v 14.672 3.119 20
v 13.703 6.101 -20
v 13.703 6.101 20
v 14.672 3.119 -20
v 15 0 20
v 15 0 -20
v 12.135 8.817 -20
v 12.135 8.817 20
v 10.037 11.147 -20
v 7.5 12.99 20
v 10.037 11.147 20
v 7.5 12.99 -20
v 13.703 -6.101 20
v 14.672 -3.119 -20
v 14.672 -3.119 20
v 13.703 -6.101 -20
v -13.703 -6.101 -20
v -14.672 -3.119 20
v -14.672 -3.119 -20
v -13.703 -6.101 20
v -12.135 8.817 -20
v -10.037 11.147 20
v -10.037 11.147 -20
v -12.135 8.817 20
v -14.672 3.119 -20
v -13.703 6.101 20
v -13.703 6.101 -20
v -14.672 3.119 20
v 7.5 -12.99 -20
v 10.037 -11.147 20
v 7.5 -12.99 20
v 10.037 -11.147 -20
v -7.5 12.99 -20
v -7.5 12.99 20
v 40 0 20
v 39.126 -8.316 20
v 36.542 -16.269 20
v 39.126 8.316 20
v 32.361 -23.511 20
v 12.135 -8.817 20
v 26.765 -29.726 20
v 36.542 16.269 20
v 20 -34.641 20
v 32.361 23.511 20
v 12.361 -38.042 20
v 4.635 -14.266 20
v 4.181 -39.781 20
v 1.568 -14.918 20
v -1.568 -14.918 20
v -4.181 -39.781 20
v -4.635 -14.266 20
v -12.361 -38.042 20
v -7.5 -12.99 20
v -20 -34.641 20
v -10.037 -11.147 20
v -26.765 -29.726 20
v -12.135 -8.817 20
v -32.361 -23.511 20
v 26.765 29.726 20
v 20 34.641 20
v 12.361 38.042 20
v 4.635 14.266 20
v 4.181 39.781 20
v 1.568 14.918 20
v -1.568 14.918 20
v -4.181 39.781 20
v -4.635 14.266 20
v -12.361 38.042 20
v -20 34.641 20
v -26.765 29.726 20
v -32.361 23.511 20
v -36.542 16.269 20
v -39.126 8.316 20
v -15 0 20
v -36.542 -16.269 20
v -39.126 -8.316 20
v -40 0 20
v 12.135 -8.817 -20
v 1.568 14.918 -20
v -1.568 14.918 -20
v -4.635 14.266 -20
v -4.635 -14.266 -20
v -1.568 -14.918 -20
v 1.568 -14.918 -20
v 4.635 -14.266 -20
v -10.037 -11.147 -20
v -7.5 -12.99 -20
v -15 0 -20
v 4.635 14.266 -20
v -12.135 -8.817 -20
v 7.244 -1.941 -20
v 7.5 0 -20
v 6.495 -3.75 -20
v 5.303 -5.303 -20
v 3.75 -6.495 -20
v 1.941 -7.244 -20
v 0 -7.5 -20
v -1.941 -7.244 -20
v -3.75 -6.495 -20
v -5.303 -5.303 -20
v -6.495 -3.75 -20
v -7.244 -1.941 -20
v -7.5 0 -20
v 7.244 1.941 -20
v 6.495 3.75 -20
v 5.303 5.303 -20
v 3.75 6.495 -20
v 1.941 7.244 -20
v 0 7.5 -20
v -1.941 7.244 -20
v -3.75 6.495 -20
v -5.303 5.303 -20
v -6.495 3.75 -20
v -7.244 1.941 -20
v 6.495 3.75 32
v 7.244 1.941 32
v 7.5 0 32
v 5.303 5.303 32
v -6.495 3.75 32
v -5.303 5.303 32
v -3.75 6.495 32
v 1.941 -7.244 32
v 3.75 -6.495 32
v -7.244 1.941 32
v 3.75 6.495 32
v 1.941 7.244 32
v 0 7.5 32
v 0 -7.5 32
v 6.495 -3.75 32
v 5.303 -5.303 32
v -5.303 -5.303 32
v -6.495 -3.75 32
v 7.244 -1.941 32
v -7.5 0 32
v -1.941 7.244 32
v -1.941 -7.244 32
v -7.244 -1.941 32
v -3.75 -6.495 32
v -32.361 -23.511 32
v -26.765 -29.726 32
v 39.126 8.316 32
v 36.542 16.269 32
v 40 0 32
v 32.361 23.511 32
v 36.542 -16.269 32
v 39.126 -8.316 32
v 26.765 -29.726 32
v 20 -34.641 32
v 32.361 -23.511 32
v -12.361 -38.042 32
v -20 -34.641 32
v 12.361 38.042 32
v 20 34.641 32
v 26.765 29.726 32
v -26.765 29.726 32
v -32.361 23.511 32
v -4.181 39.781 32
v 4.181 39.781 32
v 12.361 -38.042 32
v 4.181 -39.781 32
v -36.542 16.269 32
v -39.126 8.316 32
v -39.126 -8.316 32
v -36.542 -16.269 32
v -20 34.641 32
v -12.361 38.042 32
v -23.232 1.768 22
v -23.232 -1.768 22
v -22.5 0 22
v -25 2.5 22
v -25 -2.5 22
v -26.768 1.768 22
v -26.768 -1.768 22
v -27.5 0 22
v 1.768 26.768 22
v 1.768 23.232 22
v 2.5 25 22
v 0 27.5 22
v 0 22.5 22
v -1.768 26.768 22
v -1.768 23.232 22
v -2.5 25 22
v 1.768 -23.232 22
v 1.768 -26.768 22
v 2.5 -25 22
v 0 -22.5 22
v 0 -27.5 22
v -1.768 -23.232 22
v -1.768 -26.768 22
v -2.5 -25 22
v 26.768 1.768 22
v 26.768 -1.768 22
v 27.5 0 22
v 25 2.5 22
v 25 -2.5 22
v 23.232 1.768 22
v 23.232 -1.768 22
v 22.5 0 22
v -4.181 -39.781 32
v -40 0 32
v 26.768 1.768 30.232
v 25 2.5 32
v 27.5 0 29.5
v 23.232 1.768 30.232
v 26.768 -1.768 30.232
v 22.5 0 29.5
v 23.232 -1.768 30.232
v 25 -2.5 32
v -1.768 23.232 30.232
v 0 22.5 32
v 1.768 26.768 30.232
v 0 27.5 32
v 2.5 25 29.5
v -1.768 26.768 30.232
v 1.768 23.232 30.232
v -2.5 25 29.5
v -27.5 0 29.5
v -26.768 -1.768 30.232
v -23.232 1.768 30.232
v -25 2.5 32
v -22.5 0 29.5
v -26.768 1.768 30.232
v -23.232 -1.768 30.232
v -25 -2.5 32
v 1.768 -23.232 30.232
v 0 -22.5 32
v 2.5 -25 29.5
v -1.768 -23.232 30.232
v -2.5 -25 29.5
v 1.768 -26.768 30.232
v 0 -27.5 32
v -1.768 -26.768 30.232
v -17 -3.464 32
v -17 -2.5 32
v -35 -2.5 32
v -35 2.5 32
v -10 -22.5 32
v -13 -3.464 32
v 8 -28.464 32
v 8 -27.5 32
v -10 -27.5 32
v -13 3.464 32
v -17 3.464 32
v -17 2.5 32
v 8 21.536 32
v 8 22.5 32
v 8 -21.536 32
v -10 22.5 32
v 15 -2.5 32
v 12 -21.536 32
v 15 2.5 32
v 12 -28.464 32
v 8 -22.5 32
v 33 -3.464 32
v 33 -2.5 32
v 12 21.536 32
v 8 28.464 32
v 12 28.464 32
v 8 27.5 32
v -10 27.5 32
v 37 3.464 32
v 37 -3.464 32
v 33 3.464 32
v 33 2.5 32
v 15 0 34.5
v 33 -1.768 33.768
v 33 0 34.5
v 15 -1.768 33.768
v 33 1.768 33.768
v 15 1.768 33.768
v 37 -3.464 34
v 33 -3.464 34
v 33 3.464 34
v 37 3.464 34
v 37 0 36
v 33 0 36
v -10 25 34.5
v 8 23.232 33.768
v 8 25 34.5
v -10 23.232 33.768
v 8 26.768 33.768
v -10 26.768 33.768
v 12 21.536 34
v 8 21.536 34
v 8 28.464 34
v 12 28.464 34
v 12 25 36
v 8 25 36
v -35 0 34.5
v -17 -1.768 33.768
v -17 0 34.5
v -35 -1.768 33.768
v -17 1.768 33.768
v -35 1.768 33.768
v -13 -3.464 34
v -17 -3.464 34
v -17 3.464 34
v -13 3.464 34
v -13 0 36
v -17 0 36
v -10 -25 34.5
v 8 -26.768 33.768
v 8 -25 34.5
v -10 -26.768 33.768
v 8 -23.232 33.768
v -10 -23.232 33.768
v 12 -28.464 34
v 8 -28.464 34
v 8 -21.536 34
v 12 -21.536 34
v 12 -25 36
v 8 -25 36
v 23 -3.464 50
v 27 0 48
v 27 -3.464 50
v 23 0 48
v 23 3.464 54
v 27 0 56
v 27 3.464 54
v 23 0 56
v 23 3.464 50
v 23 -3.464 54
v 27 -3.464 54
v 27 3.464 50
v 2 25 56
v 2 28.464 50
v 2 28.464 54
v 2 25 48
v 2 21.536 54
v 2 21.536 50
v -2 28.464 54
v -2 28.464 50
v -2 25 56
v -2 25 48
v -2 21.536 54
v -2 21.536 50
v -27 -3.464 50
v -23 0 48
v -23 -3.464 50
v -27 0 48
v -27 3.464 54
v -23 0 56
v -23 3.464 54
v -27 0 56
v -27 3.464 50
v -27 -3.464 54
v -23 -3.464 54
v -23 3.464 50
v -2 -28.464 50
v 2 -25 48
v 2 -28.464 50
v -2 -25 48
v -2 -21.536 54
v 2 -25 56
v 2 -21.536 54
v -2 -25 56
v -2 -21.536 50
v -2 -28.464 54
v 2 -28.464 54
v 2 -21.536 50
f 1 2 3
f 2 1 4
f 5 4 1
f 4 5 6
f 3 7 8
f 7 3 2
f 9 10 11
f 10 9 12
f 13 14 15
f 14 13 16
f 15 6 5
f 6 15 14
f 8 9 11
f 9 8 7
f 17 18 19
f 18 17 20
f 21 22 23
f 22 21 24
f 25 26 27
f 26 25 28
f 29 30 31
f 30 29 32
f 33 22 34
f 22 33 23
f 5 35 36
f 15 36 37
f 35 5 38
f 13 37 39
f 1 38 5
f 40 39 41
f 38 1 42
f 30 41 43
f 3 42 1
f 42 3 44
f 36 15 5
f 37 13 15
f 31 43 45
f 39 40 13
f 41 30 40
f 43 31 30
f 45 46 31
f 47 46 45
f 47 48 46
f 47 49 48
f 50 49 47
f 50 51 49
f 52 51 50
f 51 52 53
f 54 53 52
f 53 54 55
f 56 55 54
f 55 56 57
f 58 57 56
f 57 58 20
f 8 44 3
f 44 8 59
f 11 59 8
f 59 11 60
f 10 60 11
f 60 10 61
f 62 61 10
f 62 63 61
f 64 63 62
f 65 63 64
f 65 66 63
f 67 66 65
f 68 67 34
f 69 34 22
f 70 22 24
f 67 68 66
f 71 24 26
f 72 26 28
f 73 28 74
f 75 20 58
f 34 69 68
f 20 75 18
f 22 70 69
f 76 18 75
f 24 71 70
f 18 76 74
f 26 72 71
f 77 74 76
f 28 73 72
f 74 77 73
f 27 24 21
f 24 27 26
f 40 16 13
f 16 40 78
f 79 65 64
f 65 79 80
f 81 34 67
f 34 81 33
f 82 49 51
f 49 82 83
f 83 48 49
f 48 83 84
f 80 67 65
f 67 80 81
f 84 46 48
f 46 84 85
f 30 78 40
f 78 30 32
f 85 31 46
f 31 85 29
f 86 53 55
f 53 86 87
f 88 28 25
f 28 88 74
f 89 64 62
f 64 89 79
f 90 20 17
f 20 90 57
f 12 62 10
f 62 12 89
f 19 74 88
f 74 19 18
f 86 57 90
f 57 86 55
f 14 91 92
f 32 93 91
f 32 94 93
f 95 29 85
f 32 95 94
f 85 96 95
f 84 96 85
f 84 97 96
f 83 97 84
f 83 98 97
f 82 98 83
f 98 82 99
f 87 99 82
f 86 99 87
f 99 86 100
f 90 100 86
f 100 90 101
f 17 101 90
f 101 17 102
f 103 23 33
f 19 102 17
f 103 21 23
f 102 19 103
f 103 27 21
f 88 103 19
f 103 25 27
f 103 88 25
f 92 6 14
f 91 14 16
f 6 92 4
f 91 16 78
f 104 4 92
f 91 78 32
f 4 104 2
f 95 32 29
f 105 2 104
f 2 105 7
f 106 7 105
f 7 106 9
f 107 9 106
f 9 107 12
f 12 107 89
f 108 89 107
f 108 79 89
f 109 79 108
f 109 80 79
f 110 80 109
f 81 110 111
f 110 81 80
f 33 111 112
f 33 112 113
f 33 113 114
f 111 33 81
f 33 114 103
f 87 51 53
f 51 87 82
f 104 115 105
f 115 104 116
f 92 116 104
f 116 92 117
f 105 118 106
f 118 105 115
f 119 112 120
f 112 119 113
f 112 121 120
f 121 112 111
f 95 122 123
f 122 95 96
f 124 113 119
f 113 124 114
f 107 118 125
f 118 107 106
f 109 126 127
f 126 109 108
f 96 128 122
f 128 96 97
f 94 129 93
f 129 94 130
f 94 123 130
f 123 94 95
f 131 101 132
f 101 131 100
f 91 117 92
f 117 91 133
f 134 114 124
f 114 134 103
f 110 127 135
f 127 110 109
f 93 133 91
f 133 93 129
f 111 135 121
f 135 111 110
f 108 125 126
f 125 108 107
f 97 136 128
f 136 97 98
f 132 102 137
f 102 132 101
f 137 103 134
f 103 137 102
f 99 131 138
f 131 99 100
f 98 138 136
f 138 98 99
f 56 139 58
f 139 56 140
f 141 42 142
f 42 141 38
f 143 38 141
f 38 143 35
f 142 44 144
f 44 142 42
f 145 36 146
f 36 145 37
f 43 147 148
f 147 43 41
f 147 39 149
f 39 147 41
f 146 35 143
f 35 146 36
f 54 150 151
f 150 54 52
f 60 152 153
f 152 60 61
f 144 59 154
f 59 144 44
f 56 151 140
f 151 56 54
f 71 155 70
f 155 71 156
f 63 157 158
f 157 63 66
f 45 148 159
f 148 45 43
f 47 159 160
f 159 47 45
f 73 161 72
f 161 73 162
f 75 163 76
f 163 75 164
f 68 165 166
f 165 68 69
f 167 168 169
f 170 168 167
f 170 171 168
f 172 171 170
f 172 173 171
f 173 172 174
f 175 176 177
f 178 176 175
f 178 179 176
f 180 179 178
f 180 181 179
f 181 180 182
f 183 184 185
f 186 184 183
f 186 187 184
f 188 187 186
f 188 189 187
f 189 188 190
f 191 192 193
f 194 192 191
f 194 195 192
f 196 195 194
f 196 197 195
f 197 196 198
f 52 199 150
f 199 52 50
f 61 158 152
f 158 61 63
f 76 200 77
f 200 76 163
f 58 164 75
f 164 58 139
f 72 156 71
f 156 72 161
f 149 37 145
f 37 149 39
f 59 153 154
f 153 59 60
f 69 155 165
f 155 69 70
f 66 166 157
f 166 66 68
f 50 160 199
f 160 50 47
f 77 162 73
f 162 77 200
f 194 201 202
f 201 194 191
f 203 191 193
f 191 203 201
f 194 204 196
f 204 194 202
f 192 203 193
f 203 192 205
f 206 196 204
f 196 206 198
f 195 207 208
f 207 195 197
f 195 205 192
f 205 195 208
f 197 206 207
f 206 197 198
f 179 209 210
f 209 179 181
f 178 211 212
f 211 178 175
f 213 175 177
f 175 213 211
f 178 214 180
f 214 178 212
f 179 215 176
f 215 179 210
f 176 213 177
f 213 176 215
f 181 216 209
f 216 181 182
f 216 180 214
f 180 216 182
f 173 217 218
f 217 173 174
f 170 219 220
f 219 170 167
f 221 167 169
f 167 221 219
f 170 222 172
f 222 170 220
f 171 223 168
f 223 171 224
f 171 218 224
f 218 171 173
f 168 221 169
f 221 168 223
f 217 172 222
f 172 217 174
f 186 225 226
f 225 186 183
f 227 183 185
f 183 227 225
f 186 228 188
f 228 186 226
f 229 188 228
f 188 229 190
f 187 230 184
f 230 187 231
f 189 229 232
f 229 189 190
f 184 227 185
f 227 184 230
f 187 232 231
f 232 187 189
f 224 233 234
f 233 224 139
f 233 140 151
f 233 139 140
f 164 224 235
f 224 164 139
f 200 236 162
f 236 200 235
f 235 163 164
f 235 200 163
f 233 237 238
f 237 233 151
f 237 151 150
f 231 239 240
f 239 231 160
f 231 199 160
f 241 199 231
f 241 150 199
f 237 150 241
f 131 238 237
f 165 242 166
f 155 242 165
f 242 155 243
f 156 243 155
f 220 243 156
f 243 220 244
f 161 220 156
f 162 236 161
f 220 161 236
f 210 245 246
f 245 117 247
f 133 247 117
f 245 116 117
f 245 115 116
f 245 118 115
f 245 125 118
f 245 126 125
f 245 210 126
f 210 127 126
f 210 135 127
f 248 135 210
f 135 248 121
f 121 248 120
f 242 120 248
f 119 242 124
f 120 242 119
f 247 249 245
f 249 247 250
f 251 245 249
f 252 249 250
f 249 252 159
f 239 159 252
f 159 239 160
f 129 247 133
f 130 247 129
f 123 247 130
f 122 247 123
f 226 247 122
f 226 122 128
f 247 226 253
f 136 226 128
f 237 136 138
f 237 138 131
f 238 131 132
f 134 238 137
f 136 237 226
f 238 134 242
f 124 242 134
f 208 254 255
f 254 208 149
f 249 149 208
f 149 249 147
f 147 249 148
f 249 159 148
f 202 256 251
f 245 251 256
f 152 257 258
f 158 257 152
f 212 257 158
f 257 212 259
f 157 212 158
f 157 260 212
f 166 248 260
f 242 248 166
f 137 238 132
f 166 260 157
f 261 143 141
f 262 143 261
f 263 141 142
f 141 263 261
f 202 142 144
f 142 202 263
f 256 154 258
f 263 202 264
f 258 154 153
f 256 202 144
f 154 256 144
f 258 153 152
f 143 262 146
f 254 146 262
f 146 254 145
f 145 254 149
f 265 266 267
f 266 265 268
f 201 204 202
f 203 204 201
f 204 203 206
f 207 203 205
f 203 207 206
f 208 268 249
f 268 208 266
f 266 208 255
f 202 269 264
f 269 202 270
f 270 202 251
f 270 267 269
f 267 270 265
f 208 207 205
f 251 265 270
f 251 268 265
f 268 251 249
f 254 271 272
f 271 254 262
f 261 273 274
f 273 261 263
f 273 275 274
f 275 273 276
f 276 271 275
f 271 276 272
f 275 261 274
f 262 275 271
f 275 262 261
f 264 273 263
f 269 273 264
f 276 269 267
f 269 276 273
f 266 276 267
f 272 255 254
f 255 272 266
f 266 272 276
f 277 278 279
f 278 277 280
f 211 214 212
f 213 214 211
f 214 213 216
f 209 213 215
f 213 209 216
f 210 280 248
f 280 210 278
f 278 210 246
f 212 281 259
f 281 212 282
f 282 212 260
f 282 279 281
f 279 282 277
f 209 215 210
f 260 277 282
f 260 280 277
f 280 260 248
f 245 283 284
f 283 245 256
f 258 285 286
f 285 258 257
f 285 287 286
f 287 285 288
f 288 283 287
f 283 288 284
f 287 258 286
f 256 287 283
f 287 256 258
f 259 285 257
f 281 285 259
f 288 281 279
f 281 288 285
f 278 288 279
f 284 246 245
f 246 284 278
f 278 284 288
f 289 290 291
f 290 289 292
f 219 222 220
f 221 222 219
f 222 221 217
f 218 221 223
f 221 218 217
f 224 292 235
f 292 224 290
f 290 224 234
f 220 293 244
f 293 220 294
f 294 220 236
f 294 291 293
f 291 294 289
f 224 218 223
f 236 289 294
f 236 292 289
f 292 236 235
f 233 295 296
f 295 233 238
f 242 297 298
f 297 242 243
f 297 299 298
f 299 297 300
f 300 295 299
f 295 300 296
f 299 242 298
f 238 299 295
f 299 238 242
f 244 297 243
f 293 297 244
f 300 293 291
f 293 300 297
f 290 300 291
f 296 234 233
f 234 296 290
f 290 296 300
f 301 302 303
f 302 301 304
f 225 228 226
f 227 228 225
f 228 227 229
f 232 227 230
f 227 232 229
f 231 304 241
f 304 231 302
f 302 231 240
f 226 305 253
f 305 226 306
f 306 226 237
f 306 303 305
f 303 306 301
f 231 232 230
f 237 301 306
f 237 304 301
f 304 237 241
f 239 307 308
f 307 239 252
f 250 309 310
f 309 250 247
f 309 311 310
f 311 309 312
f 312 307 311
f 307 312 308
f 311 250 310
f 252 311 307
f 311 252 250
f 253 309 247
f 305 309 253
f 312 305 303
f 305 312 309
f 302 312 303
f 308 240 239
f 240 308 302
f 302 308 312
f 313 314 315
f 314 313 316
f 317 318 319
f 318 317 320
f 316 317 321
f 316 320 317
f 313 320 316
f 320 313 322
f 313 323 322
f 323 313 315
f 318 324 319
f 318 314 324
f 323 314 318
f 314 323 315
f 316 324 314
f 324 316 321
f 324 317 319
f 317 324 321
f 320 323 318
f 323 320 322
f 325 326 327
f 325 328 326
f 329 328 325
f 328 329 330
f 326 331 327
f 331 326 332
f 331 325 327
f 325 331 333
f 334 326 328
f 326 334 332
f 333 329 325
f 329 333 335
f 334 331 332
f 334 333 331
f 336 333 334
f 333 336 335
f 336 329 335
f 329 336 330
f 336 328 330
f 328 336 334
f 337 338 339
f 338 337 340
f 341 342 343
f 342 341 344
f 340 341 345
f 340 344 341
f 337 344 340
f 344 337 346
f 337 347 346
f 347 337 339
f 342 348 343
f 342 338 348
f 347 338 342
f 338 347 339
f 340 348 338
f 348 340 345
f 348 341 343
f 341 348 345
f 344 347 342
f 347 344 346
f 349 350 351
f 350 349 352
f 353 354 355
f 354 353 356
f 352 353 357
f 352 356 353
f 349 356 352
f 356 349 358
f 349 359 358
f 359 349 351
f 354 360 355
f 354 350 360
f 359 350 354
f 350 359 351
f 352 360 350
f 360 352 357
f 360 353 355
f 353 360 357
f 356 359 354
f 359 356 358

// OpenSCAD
// Parameters
hub_diameter = 30;
hub_length = 40;
shaft_hole_diameter = 15;
flange_diameter = 80;
flange_thickness = 10;
spacer_thickness = 2;
bolt_hole_diameter = 5;
bolt_diameter = 5;
bolt_length = 20;
nut_size = 8;
bolt_count = 4;
bolt_circle_diameter = 50;

// Hub with bolt holes and refined structure
module hub() {
    difference() {
        cylinder(d=hub_diameter, h=hub_length, center=true);
        cylinder(d=shaft_hole_diameter, h=hub_length + 2, center=true);
        
        // Adding bolt holes on the hub
        for (i = [0:bolt_count-1]) {
            angle = i * 360 / bolt_count;
            translate([bolt_circle_diameter/2 * cos(angle), bolt_circle_diameter/2 * sin(angle), 0])
                cylinder(d=bolt_hole_diameter, h=hub_length + 2, center=true);
        }
    }
}

// Flange Plate with bolt holes
module flange_plate() {
    difference() {
        cylinder(d=flange_diameter, h=flange_thickness, center=true);
        cylinder(d=shaft_hole_diameter, h=flange_thickness + 2, center=true);
        
        for (i = [0:bolt_count-1]) {
            angle = i * 360 / bolt_count;
            translate([bolt_circle_diameter/2 * cos(angle), bolt_circle_diameter/2 * sin(angle), 0])
                cylinder(d=bolt_hole_diameter, h=flange_thickness + 2, center=true);
        }
    }
}

// Spacer Ring
module spacer_ring() {
    difference() {
        cylinder(d=flange_diameter, h=spacer_thickness, center=true);
        cylinder(d=shaft_hole_diameter, h=spacer_thickness + 2, center=true);
    }
}

// Bolt with hexagonal head
module bolt() {
    union() {
        cylinder(d=bolt_diameter, h=bolt_length, center=true);
        translate([0, 0, bolt_length/2])
            cylinder(d=nut_size, h=nut_size/2, center=true, $fn=6);
    }
}

// Nut
module nut() {
    cylinder(d=nut_size, h=nut_size/2, center=true, $fn=6);
}

// Assembly
module coupling_assembly() {
    hub();
    translate([0, 0, hub_length/2 + spacer_thickness/2])
        spacer_ring();
    translate([0, 0, hub_length/2 + spacer_thickness + flange_thickness/2])
        flange_plate();
    
    for (i = [0:bolt_count-1]) {
        angle = i * 360 / bolt_count;
        translate([bolt_circle_diameter/2 * cos(angle), bolt_circle_diameter/2 * sin(angle), hub_length/2 + spacer_thickness + flange_thickness])
            rotate([0, 90, 0])
                bolt();
        translate([bolt_circle_diameter/2 * cos(angle), bolt_circle_diameter/2 * sin(angle), hub_length/2 + spacer_thickness + flange_thickness + bolt_length])
            rotate([0, 90, 0])
                nut();
    }
}

// Render the coupling assembly
coupling_assembly();
